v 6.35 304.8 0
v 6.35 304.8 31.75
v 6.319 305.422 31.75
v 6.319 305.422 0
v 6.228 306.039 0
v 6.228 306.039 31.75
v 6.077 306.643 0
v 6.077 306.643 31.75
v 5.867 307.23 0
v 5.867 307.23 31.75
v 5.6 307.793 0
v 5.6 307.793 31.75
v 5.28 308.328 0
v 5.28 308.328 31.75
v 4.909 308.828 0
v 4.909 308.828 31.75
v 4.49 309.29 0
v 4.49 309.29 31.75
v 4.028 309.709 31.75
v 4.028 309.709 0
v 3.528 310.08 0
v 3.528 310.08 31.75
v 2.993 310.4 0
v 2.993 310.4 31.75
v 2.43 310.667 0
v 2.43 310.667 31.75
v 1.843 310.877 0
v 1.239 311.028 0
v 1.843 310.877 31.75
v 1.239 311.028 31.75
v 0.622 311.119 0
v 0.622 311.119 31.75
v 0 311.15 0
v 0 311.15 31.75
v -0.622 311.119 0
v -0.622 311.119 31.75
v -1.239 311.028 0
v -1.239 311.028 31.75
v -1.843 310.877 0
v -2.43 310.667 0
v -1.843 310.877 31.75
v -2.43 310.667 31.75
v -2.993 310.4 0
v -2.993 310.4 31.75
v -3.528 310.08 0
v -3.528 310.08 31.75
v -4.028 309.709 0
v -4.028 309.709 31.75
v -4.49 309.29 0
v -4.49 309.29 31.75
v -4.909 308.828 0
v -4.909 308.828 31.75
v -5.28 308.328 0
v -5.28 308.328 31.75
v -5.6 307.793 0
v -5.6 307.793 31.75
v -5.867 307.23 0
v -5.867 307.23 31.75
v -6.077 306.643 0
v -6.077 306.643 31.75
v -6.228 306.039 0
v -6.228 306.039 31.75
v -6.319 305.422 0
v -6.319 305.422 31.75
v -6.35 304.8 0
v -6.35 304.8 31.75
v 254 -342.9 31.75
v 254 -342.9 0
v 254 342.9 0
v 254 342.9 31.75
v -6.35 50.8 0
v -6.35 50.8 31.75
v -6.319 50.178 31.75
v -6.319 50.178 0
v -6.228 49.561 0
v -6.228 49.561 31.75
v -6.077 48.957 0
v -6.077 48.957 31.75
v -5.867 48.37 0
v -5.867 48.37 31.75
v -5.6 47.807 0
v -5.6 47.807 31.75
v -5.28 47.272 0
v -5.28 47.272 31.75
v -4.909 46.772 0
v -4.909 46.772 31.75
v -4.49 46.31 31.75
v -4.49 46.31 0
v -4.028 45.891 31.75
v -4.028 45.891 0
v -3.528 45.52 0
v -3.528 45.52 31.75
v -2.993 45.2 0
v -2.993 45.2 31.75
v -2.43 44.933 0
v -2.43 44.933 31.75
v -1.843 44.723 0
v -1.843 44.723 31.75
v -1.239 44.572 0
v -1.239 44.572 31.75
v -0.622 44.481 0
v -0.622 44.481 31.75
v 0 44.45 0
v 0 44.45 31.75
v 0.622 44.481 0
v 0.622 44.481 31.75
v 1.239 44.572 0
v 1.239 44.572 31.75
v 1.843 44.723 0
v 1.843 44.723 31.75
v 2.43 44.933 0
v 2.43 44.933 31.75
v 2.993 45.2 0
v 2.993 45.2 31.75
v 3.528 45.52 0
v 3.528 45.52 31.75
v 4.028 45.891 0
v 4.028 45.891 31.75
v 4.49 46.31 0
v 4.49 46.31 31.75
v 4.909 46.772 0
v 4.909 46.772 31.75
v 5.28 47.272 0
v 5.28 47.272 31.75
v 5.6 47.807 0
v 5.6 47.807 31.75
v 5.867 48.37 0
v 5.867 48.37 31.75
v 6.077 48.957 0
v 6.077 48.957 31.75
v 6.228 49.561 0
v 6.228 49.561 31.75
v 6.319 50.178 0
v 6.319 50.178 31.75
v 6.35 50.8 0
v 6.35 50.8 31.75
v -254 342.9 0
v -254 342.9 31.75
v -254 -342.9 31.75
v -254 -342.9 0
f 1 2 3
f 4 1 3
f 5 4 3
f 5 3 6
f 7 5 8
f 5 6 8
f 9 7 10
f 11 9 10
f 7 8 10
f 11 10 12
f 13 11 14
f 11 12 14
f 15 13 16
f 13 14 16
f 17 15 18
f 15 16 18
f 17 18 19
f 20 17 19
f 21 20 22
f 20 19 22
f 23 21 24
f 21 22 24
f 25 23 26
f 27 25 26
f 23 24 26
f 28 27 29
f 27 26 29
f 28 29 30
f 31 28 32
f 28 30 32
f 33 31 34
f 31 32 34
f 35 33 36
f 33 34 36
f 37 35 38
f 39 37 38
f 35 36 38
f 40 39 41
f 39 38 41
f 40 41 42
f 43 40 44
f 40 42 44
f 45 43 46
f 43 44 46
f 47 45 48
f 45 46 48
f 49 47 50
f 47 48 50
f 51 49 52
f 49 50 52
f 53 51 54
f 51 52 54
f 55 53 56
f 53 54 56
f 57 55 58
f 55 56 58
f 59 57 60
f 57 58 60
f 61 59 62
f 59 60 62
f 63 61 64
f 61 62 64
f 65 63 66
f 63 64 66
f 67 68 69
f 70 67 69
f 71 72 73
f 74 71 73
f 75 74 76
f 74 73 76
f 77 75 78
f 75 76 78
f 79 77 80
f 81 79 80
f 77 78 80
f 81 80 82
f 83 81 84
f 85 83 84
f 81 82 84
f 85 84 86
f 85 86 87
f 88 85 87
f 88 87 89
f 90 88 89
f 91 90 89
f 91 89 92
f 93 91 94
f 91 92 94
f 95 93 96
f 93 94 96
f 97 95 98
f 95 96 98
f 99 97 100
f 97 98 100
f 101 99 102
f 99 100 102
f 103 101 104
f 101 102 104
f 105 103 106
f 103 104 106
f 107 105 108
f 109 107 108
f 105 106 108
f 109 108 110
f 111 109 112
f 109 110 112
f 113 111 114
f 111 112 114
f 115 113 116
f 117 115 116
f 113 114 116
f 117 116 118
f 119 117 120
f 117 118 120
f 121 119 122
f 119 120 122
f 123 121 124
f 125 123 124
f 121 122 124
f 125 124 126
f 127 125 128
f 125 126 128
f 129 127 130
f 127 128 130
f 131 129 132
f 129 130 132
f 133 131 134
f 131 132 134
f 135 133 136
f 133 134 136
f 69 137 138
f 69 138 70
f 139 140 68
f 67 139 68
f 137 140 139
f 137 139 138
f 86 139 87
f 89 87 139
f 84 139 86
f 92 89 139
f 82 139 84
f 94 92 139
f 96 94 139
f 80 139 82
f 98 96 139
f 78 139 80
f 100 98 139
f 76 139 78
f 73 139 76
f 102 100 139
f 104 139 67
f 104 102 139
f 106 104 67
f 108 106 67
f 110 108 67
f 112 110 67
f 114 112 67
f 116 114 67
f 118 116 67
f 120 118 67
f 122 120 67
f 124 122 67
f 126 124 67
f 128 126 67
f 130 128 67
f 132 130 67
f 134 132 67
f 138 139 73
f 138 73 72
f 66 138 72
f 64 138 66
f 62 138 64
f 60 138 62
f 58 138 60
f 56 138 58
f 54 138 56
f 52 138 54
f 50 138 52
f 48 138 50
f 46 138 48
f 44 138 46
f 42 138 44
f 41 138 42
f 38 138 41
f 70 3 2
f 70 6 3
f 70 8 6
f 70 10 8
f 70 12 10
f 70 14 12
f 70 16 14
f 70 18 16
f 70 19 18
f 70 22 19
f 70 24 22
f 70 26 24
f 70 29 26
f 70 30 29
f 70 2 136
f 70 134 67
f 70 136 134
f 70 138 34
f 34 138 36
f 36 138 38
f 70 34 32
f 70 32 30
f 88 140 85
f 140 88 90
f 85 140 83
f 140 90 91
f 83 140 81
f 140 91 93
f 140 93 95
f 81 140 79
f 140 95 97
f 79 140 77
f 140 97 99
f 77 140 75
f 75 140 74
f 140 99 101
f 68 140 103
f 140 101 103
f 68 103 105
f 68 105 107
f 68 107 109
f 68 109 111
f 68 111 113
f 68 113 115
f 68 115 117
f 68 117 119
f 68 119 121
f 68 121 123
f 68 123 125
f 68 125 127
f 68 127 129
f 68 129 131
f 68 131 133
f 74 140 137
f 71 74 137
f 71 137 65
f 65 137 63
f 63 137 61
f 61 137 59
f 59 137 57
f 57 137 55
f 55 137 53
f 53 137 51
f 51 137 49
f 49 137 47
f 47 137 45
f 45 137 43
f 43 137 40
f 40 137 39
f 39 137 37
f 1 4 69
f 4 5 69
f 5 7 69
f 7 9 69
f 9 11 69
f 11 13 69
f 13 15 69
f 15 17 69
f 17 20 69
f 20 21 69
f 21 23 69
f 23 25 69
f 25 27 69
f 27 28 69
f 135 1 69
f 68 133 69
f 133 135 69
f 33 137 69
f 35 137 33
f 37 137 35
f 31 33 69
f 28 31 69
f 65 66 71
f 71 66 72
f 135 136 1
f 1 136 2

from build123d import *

# Parameters (mm, degrees)
F0_W     = 508
F0_H     = 685.8
F1_DEPTH = 31.75
F3_DEPTH = 31.75


with BuildPart() as f1:
    # F0 (on Top) → F1 (new body)
    with BuildSketch(Plane.XY):
        Rectangle(F0_W, F0_H)
    extrude(amount=F1_DEPTH)

    # F2 (on face) → F3 (cut)
    with BuildSketch(Plane.XY.offset(31.75)):
        with BuildLine():
            ThreePointArc((-6.35, 304.8), (0, 298.45), (6.35, 304.8))
            ThreePointArc((6.35, 304.8), (0, 311.15), (-6.35, 304.8))
        make_face()
        with BuildLine():
            ThreePointArc((-6.35, 50.8), (0, 44.45), (6.35, 50.8))
            ThreePointArc((6.35, 50.8), (0, 57.15), (-6.35, 50.8))
        make_face()
        with BuildLine():
            Line((6.35, 50.8), (6.35, 304.8))
            ThreePointArc((6.35, 304.8), (0, 298.45), (-6.35, 304.8))
            Line((-6.35, 304.8), (-6.35, 50.8))
            ThreePointArc((-6.35, 50.8), (0, 57.15), (6.35, 50.8))
        make_face()
    extrude(amount=-F3_DEPTH, mode=Mode.SUBTRACT)


solid = f1.part
